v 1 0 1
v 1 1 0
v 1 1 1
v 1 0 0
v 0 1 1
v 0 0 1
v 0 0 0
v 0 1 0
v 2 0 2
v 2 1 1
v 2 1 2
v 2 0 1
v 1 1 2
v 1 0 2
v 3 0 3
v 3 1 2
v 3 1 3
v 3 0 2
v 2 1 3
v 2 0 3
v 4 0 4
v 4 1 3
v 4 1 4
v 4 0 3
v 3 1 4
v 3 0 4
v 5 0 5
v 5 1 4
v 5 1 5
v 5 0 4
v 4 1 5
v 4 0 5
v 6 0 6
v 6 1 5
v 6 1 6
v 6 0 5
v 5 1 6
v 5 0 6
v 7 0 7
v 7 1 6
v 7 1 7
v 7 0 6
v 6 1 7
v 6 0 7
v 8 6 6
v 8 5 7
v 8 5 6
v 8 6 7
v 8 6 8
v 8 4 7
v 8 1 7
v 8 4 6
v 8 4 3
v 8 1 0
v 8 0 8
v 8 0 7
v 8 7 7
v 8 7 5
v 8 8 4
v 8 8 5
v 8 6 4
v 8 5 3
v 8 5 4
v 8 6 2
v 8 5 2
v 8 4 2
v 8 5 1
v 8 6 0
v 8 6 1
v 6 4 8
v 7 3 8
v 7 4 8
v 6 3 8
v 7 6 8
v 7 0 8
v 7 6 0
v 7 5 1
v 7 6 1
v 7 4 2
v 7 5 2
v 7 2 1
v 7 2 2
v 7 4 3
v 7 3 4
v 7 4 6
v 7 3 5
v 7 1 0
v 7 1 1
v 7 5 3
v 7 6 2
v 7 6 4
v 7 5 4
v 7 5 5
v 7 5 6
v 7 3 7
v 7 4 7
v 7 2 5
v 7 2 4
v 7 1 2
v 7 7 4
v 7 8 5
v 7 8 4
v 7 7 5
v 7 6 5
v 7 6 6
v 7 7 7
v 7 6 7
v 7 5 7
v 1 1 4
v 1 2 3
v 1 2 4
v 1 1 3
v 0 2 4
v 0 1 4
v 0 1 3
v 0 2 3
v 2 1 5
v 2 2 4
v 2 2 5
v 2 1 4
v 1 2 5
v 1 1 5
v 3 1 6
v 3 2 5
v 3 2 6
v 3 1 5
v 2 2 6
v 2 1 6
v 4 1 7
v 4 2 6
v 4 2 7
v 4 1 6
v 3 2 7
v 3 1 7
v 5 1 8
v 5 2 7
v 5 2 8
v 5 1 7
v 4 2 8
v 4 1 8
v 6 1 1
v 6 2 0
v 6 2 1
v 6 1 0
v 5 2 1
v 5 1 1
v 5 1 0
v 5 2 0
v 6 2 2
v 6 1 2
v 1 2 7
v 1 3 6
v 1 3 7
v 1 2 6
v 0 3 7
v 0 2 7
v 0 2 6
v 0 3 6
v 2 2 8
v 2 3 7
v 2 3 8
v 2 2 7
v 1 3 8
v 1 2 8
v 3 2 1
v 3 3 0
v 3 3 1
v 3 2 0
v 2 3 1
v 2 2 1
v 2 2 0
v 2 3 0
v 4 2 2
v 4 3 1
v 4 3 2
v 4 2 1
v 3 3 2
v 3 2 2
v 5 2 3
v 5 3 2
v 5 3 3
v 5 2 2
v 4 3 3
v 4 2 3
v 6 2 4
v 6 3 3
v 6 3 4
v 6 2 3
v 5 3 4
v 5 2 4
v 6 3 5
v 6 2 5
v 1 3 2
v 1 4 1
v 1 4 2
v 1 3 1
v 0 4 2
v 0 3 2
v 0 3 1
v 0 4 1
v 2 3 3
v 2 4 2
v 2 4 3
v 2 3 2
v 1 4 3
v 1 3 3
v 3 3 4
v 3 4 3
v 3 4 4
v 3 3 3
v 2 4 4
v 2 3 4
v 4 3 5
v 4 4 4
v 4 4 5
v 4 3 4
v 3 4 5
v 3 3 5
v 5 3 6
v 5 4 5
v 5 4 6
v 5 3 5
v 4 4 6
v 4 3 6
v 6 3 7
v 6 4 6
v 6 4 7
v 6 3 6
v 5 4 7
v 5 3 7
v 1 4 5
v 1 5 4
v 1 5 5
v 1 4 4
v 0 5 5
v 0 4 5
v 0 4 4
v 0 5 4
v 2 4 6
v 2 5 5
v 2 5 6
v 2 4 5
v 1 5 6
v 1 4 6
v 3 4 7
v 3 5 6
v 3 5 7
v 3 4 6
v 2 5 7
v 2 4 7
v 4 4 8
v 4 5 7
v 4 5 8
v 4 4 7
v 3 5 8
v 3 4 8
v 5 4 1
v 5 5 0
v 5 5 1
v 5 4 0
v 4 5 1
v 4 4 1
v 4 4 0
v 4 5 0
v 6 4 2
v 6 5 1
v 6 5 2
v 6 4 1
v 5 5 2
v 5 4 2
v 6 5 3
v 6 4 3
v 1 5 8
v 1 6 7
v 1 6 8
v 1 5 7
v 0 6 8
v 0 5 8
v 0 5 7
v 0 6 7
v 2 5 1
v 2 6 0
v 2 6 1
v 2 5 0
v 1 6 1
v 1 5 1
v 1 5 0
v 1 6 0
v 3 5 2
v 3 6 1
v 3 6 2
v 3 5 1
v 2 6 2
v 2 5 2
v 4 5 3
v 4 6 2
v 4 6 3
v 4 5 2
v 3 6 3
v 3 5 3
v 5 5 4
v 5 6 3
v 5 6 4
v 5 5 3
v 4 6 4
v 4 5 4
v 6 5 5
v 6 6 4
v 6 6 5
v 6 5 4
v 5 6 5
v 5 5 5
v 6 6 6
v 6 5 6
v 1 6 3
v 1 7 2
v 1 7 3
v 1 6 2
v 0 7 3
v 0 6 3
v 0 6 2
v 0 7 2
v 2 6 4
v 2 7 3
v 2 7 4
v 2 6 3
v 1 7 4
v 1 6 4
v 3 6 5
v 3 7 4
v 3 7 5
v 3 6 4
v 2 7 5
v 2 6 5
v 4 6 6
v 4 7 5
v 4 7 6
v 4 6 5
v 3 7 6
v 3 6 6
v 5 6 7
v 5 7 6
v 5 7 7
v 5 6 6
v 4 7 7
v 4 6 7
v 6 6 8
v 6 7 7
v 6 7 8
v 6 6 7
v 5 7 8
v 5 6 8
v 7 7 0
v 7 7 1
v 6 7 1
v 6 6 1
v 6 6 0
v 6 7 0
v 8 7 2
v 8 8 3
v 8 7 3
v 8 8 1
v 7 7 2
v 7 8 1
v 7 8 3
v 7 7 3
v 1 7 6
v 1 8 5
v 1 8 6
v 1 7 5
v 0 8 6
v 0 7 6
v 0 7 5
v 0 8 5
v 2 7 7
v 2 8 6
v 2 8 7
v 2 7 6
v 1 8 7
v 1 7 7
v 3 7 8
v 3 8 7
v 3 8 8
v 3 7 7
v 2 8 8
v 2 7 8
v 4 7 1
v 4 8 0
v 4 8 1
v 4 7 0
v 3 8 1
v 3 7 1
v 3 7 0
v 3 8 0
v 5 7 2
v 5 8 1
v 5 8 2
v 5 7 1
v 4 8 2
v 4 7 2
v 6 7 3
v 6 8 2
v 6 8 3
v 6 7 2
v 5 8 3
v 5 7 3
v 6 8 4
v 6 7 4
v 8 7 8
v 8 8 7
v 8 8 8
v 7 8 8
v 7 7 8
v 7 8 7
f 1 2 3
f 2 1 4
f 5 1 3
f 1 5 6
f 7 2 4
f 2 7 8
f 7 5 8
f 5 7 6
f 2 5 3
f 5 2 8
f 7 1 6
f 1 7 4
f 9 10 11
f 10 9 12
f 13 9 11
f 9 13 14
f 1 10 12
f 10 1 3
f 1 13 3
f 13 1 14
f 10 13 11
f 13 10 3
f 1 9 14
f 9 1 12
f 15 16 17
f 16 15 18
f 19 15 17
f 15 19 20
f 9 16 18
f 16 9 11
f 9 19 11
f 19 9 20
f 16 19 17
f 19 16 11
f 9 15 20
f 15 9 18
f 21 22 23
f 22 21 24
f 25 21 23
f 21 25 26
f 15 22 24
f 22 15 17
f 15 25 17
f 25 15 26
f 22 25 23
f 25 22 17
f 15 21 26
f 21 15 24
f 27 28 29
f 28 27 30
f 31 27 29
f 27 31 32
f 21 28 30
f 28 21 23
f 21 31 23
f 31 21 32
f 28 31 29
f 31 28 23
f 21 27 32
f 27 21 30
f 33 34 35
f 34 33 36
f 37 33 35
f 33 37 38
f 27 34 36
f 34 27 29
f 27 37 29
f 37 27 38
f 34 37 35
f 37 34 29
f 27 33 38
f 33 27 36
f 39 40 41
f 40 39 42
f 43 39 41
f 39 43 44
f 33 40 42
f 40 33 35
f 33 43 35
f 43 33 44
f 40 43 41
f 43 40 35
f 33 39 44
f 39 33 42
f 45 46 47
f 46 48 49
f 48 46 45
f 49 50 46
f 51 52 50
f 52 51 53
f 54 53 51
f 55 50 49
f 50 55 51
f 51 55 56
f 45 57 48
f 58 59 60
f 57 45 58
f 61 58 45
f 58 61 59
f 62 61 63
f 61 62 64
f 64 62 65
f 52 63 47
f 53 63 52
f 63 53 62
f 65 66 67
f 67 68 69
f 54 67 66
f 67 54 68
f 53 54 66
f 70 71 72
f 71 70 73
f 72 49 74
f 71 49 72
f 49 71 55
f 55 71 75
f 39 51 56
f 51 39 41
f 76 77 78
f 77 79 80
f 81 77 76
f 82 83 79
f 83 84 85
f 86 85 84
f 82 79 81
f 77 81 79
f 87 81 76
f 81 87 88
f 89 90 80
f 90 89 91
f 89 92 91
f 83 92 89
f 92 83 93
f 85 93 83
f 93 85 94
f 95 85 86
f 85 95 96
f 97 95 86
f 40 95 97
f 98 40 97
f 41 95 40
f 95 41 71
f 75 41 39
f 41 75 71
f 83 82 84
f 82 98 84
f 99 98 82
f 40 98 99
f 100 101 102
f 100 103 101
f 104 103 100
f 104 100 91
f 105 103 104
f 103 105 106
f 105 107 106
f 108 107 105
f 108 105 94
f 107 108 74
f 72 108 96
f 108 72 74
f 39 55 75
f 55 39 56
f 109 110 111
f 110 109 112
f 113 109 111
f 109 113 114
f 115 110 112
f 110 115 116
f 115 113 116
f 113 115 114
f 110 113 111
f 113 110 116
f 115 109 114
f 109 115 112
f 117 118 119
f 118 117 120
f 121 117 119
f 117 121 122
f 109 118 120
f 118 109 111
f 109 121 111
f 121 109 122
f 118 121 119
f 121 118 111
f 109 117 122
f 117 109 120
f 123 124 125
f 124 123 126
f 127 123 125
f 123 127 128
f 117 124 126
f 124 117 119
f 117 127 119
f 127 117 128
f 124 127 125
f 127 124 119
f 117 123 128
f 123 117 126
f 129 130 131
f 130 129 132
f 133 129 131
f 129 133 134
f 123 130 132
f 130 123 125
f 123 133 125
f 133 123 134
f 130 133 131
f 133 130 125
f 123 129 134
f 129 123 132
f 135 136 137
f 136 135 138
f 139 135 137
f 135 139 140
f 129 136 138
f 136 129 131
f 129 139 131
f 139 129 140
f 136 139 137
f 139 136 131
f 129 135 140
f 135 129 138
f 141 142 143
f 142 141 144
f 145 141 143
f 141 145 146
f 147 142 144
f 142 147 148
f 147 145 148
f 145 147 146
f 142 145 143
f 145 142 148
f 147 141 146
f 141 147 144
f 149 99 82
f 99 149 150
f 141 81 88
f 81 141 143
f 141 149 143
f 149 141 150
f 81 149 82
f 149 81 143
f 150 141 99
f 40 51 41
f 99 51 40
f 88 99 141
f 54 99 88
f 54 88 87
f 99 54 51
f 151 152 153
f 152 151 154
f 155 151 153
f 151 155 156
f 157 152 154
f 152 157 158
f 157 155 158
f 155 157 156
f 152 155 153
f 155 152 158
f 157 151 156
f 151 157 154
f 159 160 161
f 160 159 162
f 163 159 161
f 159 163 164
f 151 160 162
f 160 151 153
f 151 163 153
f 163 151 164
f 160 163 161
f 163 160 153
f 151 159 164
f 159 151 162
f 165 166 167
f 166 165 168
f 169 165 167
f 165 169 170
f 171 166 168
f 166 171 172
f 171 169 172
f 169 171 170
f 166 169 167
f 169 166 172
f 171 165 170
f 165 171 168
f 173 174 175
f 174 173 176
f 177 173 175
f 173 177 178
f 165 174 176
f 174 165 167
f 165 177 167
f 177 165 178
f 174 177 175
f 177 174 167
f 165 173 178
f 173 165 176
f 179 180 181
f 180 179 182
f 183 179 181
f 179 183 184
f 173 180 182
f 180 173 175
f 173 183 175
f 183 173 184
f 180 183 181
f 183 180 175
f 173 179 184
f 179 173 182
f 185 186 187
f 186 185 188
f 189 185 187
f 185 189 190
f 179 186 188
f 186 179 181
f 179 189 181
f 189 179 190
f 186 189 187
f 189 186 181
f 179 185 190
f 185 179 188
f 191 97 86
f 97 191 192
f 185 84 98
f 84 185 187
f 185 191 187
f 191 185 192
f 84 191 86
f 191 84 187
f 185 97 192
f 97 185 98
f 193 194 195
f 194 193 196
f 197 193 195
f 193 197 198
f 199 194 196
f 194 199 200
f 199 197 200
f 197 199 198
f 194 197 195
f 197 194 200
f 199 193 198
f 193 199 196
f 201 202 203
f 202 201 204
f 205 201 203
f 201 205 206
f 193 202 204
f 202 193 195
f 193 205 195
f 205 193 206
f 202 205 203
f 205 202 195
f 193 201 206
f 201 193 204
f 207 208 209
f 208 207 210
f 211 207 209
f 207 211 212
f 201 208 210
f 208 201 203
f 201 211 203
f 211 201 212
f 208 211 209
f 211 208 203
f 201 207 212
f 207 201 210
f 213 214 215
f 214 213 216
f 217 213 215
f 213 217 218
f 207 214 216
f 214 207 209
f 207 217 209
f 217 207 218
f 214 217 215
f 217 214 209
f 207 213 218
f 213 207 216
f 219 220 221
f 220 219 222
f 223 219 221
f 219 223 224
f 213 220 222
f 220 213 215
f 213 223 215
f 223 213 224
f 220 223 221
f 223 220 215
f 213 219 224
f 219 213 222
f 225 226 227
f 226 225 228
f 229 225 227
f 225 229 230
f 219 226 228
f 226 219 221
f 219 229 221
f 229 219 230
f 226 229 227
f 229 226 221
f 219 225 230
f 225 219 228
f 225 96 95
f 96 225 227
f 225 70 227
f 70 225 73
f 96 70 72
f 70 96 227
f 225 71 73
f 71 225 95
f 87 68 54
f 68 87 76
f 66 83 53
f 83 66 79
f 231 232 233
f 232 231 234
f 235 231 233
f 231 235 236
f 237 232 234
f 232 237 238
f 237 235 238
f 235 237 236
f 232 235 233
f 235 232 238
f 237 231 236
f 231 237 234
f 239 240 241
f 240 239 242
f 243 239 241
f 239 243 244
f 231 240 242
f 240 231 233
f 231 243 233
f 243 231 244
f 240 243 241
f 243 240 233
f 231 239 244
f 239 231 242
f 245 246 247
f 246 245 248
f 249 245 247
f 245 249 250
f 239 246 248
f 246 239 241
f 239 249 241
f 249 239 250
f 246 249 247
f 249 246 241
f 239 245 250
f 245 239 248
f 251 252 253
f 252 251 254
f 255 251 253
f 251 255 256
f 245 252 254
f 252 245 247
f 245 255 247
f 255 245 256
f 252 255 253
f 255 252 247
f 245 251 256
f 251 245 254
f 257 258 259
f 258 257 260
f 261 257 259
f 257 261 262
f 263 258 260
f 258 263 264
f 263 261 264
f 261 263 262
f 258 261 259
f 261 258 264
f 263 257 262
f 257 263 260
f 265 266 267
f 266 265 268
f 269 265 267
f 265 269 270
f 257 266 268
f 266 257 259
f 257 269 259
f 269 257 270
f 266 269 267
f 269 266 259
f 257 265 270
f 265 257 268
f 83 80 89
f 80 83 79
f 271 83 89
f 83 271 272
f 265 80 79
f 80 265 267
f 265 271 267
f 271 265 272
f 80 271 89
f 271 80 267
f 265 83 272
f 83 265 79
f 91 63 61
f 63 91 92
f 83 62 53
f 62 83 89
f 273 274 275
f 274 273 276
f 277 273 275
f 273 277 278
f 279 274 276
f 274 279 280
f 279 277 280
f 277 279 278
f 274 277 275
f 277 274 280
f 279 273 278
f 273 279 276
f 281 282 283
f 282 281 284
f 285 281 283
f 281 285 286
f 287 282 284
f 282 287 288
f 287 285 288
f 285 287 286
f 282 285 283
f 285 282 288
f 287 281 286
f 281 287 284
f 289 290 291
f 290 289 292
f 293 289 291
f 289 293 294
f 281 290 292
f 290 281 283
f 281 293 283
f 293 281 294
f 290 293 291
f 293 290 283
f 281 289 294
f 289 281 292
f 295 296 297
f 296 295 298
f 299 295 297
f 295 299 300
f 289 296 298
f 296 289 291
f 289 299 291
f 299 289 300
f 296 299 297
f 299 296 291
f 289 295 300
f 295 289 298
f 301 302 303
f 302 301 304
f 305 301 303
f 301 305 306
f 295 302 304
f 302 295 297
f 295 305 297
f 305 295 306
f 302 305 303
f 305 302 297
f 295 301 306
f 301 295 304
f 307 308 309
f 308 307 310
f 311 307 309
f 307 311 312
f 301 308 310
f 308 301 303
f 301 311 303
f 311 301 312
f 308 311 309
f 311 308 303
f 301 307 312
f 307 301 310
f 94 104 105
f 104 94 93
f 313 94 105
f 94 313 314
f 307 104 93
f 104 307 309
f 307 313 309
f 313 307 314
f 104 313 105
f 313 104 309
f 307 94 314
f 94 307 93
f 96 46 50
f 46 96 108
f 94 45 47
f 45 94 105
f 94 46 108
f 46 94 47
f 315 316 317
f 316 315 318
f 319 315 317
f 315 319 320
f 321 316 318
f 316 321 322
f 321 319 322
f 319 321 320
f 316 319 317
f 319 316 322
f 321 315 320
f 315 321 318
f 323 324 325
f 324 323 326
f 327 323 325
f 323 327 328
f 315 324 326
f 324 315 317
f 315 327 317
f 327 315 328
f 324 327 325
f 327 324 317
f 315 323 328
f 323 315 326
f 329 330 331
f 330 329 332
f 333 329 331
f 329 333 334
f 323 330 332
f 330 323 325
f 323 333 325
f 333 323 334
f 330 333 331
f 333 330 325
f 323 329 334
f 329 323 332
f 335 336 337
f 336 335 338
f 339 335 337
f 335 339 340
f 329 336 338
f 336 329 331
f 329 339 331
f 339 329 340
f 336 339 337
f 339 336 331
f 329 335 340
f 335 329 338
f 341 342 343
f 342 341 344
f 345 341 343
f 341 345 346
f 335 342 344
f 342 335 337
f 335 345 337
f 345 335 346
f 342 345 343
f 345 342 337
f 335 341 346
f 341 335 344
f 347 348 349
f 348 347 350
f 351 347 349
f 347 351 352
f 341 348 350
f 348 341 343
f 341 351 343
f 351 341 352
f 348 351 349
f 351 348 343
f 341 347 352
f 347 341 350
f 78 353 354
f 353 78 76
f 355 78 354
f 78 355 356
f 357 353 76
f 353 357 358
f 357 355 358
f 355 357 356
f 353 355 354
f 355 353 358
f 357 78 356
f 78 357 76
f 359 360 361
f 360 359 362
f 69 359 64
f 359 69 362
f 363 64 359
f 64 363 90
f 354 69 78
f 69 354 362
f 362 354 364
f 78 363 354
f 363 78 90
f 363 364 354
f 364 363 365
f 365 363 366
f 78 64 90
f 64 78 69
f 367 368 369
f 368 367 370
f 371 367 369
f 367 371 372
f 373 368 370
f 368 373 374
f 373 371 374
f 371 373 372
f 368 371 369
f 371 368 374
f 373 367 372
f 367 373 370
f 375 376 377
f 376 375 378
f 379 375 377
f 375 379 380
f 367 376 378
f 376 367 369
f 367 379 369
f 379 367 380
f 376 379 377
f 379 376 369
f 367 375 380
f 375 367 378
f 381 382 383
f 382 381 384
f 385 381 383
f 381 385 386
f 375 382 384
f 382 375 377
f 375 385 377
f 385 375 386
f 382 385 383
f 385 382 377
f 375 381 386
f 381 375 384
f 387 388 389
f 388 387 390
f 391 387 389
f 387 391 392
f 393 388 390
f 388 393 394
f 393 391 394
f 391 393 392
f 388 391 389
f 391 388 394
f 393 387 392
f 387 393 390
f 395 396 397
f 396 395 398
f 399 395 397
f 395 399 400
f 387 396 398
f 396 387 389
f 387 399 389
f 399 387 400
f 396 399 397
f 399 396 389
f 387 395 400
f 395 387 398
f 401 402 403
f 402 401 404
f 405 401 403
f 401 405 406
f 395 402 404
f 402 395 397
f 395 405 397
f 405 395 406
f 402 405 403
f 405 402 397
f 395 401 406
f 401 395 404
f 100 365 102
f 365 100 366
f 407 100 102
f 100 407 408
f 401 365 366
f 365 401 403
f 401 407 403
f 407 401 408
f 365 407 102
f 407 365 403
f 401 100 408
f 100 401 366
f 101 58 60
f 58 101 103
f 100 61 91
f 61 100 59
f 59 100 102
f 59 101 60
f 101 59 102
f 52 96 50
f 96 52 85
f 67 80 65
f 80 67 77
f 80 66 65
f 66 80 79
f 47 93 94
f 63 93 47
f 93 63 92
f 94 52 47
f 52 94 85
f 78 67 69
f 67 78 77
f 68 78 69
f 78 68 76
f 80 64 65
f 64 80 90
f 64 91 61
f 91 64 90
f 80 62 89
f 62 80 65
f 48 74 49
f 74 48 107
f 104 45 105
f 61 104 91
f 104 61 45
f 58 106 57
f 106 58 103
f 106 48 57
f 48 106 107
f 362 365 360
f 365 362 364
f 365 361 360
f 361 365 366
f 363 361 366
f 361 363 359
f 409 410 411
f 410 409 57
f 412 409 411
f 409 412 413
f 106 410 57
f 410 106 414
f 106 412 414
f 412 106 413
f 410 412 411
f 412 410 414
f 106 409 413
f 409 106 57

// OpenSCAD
union() {
    translate([0, 0, 0]) cube([1, 1, 1]);
    translate([1, 0, 1]) cube([1, 1, 1]);
    translate([2, 0, 2]) cube([1, 1, 1]);
    translate([3, 0, 3]) cube([1, 1, 1]);
    translate([4, 0, 4]) cube([1, 1, 1]);
    translate([5, 0, 5]) cube([1, 1, 1]);
    translate([6, 0, 6]) cube([1, 1, 1]);
    translate([7, 0, 7]) cube([1, 1, 1]);
    translate([0, 1, 3]) cube([1, 1, 1]);
    translate([1, 1, 4]) cube([1, 1, 1]);
    translate([2, 1, 5]) cube([1, 1, 1]);
    translate([3, 1, 6]) cube([1, 1, 1]);
    translate([4, 1, 7]) cube([1, 1, 1]);
    translate([5, 1, 0]) cube([1, 1, 1]);
    translate([6, 1, 1]) cube([1, 1, 1]);
    translate([7, 1, 2]) cube([1, 1, 1]);
    translate([0, 2, 6]) cube([1, 1, 1]);
    translate([1, 2, 7]) cube([1, 1, 1]);
    translate([2, 2, 0]) cube([1, 1, 1]);
    translate([3, 2, 1]) cube([1, 1, 1]);
    translate([4, 2, 2]) cube([1, 1, 1]);
    translate([5, 2, 3]) cube([1, 1, 1]);
    translate([6, 2, 4]) cube([1, 1, 1]);
    translate([7, 2, 5]) cube([1, 1, 1]);
    translate([0, 3, 1]) cube([1, 1, 1]);
    translate([1, 3, 2]) cube([1, 1, 1]);
    translate([2, 3, 3]) cube([1, 1, 1]);
    translate([3, 3, 4]) cube([1, 1, 1]);
    translate([4, 3, 5]) cube([1, 1, 1]);
    translate([5, 3, 6]) cube([1, 1, 1]);
    translate([6, 3, 7]) cube([1, 1, 1]);
    translate([7, 3, 0]) cube([1, 1, 1]);
    translate([0, 4, 4]) cube([1, 1, 1]);
    translate([1, 4, 5]) cube([1, 1, 1]);
    translate([2, 4, 6]) cube([1, 1, 1]);
    translate([3, 4, 7]) cube([1, 1, 1]);
    translate([4, 4, 0]) cube([1, 1, 1]);
    translate([5, 4, 1]) cube([1, 1, 1]);
    translate([6, 4, 2]) cube([1, 1, 1]);
    translate([7, 4, 3]) cube([1, 1, 1]);
    translate([0, 5, 7]) cube([1, 1, 1]);
    translate([1, 5, 0]) cube([1, 1, 1]);
    translate([2, 5, 1]) cube([1, 1, 1]);
    translate([3, 5, 2]) cube([1, 1, 1]);
    translate([4, 5, 3]) cube([1, 1, 1]);
    translate([5, 5, 4]) cube([1, 1, 1]);
    translate([6, 5, 5]) cube([1, 1, 1]);
    translate([7, 5, 6]) cube([1, 1, 1]);
    translate([0, 6, 2]) cube([1, 1, 1]);
    translate([1, 6, 3]) cube([1, 1, 1]);
    translate([2, 6, 4]) cube([1, 1, 1]);
    translate([3, 6, 5]) cube([1, 1, 1]);
    translate([4, 6, 6]) cube([1, 1, 1]);
    translate([5, 6, 7]) cube([1, 1, 1]);
    translate([6, 6, 0]) cube([1, 1, 1]);
    translate([7, 6, 1]) cube([1, 1, 1]);
    translate([0, 7, 5]) cube([1, 1, 1]);
    translate([1, 7, 6]) cube([1, 1, 1]);
    translate([2, 7, 7]) cube([1, 1, 1]);
    translate([3, 7, 0]) cube([1, 1, 1]);
    translate([4, 7, 1]) cube([1, 1, 1]);
    translate([5, 7, 2]) cube([1, 1, 1]);
    translate([6, 7, 3]) cube([1, 1, 1]);
    translate([7, 7, 4]) cube([1, 1, 1]);
    translate([7, 1, 0]) cube([1, 1, 1]);
    translate([7, 1, 1]) cube([1, 1, 1]);
    translate([7, 1, 3]) cube([1, 1, 1]);
    translate([7, 1, 4]) cube([1, 1, 1]);
    translate([7, 1, 5]) cube([1, 1, 1]);
    translate([7, 1, 6]) cube([1, 1, 1]);
    translate([7, 1, 7]) cube([1, 1, 1]);
    translate([7, 2, 0]) cube([1, 1, 1]);
    translate([7, 2, 1]) cube([1, 1, 1]);
    translate([7, 2, 2]) cube([1, 1, 1]);
    translate([7, 2, 3]) cube([1, 1, 1]);
    translate([7, 2, 4]) cube([1, 1, 1]);
    translate([7, 2, 6]) cube([1, 1, 1]);
    translate([7, 2, 7]) cube([1, 1, 1]);
    translate([7, 3, 1]) cube([1, 1, 1]);
    translate([7, 3, 2]) cube([1, 1, 1]);
    translate([7, 3, 3]) cube([1, 1, 1]);
    translate([7, 3, 4]) cube([1, 1, 1]);
    translate([7, 3, 5]) cube([1, 1, 1]);
    translate([7, 3, 6]) cube([1, 1, 1]);
    translate([7, 3, 7]) cube([1, 1, 1]);
    translate([7, 4, 0]) cube([1, 1, 1]);
    translate([7, 4, 1]) cube([1, 1, 1]);
    translate([7, 4, 4]) cube([1, 1, 1]);
    translate([7, 4, 5]) cube([1, 1, 1]);
    translate([7, 4, 7]) cube([1, 1, 1]);
    translate([7, 5, 0]) cube([1, 1, 1]);
    translate([7, 5, 2]) cube([1, 1, 1]);
    translate([7, 5, 3]) cube([1, 1, 1]);
    translate([7, 5, 7]) cube([1, 1, 1]);
    translate([7, 6, 4]) cube([1, 1, 1]);
    translate([7, 6, 5]) cube([1, 1, 1]);
    translate([7, 6, 6]) cube([1, 1, 1]);
    translate([7, 7, 1]) cube([1, 1, 1]);
    translate([7, 7, 2]) cube([1, 1, 1]);
    translate([7, 7, 7]) cube([1, 1, 1]);
}
